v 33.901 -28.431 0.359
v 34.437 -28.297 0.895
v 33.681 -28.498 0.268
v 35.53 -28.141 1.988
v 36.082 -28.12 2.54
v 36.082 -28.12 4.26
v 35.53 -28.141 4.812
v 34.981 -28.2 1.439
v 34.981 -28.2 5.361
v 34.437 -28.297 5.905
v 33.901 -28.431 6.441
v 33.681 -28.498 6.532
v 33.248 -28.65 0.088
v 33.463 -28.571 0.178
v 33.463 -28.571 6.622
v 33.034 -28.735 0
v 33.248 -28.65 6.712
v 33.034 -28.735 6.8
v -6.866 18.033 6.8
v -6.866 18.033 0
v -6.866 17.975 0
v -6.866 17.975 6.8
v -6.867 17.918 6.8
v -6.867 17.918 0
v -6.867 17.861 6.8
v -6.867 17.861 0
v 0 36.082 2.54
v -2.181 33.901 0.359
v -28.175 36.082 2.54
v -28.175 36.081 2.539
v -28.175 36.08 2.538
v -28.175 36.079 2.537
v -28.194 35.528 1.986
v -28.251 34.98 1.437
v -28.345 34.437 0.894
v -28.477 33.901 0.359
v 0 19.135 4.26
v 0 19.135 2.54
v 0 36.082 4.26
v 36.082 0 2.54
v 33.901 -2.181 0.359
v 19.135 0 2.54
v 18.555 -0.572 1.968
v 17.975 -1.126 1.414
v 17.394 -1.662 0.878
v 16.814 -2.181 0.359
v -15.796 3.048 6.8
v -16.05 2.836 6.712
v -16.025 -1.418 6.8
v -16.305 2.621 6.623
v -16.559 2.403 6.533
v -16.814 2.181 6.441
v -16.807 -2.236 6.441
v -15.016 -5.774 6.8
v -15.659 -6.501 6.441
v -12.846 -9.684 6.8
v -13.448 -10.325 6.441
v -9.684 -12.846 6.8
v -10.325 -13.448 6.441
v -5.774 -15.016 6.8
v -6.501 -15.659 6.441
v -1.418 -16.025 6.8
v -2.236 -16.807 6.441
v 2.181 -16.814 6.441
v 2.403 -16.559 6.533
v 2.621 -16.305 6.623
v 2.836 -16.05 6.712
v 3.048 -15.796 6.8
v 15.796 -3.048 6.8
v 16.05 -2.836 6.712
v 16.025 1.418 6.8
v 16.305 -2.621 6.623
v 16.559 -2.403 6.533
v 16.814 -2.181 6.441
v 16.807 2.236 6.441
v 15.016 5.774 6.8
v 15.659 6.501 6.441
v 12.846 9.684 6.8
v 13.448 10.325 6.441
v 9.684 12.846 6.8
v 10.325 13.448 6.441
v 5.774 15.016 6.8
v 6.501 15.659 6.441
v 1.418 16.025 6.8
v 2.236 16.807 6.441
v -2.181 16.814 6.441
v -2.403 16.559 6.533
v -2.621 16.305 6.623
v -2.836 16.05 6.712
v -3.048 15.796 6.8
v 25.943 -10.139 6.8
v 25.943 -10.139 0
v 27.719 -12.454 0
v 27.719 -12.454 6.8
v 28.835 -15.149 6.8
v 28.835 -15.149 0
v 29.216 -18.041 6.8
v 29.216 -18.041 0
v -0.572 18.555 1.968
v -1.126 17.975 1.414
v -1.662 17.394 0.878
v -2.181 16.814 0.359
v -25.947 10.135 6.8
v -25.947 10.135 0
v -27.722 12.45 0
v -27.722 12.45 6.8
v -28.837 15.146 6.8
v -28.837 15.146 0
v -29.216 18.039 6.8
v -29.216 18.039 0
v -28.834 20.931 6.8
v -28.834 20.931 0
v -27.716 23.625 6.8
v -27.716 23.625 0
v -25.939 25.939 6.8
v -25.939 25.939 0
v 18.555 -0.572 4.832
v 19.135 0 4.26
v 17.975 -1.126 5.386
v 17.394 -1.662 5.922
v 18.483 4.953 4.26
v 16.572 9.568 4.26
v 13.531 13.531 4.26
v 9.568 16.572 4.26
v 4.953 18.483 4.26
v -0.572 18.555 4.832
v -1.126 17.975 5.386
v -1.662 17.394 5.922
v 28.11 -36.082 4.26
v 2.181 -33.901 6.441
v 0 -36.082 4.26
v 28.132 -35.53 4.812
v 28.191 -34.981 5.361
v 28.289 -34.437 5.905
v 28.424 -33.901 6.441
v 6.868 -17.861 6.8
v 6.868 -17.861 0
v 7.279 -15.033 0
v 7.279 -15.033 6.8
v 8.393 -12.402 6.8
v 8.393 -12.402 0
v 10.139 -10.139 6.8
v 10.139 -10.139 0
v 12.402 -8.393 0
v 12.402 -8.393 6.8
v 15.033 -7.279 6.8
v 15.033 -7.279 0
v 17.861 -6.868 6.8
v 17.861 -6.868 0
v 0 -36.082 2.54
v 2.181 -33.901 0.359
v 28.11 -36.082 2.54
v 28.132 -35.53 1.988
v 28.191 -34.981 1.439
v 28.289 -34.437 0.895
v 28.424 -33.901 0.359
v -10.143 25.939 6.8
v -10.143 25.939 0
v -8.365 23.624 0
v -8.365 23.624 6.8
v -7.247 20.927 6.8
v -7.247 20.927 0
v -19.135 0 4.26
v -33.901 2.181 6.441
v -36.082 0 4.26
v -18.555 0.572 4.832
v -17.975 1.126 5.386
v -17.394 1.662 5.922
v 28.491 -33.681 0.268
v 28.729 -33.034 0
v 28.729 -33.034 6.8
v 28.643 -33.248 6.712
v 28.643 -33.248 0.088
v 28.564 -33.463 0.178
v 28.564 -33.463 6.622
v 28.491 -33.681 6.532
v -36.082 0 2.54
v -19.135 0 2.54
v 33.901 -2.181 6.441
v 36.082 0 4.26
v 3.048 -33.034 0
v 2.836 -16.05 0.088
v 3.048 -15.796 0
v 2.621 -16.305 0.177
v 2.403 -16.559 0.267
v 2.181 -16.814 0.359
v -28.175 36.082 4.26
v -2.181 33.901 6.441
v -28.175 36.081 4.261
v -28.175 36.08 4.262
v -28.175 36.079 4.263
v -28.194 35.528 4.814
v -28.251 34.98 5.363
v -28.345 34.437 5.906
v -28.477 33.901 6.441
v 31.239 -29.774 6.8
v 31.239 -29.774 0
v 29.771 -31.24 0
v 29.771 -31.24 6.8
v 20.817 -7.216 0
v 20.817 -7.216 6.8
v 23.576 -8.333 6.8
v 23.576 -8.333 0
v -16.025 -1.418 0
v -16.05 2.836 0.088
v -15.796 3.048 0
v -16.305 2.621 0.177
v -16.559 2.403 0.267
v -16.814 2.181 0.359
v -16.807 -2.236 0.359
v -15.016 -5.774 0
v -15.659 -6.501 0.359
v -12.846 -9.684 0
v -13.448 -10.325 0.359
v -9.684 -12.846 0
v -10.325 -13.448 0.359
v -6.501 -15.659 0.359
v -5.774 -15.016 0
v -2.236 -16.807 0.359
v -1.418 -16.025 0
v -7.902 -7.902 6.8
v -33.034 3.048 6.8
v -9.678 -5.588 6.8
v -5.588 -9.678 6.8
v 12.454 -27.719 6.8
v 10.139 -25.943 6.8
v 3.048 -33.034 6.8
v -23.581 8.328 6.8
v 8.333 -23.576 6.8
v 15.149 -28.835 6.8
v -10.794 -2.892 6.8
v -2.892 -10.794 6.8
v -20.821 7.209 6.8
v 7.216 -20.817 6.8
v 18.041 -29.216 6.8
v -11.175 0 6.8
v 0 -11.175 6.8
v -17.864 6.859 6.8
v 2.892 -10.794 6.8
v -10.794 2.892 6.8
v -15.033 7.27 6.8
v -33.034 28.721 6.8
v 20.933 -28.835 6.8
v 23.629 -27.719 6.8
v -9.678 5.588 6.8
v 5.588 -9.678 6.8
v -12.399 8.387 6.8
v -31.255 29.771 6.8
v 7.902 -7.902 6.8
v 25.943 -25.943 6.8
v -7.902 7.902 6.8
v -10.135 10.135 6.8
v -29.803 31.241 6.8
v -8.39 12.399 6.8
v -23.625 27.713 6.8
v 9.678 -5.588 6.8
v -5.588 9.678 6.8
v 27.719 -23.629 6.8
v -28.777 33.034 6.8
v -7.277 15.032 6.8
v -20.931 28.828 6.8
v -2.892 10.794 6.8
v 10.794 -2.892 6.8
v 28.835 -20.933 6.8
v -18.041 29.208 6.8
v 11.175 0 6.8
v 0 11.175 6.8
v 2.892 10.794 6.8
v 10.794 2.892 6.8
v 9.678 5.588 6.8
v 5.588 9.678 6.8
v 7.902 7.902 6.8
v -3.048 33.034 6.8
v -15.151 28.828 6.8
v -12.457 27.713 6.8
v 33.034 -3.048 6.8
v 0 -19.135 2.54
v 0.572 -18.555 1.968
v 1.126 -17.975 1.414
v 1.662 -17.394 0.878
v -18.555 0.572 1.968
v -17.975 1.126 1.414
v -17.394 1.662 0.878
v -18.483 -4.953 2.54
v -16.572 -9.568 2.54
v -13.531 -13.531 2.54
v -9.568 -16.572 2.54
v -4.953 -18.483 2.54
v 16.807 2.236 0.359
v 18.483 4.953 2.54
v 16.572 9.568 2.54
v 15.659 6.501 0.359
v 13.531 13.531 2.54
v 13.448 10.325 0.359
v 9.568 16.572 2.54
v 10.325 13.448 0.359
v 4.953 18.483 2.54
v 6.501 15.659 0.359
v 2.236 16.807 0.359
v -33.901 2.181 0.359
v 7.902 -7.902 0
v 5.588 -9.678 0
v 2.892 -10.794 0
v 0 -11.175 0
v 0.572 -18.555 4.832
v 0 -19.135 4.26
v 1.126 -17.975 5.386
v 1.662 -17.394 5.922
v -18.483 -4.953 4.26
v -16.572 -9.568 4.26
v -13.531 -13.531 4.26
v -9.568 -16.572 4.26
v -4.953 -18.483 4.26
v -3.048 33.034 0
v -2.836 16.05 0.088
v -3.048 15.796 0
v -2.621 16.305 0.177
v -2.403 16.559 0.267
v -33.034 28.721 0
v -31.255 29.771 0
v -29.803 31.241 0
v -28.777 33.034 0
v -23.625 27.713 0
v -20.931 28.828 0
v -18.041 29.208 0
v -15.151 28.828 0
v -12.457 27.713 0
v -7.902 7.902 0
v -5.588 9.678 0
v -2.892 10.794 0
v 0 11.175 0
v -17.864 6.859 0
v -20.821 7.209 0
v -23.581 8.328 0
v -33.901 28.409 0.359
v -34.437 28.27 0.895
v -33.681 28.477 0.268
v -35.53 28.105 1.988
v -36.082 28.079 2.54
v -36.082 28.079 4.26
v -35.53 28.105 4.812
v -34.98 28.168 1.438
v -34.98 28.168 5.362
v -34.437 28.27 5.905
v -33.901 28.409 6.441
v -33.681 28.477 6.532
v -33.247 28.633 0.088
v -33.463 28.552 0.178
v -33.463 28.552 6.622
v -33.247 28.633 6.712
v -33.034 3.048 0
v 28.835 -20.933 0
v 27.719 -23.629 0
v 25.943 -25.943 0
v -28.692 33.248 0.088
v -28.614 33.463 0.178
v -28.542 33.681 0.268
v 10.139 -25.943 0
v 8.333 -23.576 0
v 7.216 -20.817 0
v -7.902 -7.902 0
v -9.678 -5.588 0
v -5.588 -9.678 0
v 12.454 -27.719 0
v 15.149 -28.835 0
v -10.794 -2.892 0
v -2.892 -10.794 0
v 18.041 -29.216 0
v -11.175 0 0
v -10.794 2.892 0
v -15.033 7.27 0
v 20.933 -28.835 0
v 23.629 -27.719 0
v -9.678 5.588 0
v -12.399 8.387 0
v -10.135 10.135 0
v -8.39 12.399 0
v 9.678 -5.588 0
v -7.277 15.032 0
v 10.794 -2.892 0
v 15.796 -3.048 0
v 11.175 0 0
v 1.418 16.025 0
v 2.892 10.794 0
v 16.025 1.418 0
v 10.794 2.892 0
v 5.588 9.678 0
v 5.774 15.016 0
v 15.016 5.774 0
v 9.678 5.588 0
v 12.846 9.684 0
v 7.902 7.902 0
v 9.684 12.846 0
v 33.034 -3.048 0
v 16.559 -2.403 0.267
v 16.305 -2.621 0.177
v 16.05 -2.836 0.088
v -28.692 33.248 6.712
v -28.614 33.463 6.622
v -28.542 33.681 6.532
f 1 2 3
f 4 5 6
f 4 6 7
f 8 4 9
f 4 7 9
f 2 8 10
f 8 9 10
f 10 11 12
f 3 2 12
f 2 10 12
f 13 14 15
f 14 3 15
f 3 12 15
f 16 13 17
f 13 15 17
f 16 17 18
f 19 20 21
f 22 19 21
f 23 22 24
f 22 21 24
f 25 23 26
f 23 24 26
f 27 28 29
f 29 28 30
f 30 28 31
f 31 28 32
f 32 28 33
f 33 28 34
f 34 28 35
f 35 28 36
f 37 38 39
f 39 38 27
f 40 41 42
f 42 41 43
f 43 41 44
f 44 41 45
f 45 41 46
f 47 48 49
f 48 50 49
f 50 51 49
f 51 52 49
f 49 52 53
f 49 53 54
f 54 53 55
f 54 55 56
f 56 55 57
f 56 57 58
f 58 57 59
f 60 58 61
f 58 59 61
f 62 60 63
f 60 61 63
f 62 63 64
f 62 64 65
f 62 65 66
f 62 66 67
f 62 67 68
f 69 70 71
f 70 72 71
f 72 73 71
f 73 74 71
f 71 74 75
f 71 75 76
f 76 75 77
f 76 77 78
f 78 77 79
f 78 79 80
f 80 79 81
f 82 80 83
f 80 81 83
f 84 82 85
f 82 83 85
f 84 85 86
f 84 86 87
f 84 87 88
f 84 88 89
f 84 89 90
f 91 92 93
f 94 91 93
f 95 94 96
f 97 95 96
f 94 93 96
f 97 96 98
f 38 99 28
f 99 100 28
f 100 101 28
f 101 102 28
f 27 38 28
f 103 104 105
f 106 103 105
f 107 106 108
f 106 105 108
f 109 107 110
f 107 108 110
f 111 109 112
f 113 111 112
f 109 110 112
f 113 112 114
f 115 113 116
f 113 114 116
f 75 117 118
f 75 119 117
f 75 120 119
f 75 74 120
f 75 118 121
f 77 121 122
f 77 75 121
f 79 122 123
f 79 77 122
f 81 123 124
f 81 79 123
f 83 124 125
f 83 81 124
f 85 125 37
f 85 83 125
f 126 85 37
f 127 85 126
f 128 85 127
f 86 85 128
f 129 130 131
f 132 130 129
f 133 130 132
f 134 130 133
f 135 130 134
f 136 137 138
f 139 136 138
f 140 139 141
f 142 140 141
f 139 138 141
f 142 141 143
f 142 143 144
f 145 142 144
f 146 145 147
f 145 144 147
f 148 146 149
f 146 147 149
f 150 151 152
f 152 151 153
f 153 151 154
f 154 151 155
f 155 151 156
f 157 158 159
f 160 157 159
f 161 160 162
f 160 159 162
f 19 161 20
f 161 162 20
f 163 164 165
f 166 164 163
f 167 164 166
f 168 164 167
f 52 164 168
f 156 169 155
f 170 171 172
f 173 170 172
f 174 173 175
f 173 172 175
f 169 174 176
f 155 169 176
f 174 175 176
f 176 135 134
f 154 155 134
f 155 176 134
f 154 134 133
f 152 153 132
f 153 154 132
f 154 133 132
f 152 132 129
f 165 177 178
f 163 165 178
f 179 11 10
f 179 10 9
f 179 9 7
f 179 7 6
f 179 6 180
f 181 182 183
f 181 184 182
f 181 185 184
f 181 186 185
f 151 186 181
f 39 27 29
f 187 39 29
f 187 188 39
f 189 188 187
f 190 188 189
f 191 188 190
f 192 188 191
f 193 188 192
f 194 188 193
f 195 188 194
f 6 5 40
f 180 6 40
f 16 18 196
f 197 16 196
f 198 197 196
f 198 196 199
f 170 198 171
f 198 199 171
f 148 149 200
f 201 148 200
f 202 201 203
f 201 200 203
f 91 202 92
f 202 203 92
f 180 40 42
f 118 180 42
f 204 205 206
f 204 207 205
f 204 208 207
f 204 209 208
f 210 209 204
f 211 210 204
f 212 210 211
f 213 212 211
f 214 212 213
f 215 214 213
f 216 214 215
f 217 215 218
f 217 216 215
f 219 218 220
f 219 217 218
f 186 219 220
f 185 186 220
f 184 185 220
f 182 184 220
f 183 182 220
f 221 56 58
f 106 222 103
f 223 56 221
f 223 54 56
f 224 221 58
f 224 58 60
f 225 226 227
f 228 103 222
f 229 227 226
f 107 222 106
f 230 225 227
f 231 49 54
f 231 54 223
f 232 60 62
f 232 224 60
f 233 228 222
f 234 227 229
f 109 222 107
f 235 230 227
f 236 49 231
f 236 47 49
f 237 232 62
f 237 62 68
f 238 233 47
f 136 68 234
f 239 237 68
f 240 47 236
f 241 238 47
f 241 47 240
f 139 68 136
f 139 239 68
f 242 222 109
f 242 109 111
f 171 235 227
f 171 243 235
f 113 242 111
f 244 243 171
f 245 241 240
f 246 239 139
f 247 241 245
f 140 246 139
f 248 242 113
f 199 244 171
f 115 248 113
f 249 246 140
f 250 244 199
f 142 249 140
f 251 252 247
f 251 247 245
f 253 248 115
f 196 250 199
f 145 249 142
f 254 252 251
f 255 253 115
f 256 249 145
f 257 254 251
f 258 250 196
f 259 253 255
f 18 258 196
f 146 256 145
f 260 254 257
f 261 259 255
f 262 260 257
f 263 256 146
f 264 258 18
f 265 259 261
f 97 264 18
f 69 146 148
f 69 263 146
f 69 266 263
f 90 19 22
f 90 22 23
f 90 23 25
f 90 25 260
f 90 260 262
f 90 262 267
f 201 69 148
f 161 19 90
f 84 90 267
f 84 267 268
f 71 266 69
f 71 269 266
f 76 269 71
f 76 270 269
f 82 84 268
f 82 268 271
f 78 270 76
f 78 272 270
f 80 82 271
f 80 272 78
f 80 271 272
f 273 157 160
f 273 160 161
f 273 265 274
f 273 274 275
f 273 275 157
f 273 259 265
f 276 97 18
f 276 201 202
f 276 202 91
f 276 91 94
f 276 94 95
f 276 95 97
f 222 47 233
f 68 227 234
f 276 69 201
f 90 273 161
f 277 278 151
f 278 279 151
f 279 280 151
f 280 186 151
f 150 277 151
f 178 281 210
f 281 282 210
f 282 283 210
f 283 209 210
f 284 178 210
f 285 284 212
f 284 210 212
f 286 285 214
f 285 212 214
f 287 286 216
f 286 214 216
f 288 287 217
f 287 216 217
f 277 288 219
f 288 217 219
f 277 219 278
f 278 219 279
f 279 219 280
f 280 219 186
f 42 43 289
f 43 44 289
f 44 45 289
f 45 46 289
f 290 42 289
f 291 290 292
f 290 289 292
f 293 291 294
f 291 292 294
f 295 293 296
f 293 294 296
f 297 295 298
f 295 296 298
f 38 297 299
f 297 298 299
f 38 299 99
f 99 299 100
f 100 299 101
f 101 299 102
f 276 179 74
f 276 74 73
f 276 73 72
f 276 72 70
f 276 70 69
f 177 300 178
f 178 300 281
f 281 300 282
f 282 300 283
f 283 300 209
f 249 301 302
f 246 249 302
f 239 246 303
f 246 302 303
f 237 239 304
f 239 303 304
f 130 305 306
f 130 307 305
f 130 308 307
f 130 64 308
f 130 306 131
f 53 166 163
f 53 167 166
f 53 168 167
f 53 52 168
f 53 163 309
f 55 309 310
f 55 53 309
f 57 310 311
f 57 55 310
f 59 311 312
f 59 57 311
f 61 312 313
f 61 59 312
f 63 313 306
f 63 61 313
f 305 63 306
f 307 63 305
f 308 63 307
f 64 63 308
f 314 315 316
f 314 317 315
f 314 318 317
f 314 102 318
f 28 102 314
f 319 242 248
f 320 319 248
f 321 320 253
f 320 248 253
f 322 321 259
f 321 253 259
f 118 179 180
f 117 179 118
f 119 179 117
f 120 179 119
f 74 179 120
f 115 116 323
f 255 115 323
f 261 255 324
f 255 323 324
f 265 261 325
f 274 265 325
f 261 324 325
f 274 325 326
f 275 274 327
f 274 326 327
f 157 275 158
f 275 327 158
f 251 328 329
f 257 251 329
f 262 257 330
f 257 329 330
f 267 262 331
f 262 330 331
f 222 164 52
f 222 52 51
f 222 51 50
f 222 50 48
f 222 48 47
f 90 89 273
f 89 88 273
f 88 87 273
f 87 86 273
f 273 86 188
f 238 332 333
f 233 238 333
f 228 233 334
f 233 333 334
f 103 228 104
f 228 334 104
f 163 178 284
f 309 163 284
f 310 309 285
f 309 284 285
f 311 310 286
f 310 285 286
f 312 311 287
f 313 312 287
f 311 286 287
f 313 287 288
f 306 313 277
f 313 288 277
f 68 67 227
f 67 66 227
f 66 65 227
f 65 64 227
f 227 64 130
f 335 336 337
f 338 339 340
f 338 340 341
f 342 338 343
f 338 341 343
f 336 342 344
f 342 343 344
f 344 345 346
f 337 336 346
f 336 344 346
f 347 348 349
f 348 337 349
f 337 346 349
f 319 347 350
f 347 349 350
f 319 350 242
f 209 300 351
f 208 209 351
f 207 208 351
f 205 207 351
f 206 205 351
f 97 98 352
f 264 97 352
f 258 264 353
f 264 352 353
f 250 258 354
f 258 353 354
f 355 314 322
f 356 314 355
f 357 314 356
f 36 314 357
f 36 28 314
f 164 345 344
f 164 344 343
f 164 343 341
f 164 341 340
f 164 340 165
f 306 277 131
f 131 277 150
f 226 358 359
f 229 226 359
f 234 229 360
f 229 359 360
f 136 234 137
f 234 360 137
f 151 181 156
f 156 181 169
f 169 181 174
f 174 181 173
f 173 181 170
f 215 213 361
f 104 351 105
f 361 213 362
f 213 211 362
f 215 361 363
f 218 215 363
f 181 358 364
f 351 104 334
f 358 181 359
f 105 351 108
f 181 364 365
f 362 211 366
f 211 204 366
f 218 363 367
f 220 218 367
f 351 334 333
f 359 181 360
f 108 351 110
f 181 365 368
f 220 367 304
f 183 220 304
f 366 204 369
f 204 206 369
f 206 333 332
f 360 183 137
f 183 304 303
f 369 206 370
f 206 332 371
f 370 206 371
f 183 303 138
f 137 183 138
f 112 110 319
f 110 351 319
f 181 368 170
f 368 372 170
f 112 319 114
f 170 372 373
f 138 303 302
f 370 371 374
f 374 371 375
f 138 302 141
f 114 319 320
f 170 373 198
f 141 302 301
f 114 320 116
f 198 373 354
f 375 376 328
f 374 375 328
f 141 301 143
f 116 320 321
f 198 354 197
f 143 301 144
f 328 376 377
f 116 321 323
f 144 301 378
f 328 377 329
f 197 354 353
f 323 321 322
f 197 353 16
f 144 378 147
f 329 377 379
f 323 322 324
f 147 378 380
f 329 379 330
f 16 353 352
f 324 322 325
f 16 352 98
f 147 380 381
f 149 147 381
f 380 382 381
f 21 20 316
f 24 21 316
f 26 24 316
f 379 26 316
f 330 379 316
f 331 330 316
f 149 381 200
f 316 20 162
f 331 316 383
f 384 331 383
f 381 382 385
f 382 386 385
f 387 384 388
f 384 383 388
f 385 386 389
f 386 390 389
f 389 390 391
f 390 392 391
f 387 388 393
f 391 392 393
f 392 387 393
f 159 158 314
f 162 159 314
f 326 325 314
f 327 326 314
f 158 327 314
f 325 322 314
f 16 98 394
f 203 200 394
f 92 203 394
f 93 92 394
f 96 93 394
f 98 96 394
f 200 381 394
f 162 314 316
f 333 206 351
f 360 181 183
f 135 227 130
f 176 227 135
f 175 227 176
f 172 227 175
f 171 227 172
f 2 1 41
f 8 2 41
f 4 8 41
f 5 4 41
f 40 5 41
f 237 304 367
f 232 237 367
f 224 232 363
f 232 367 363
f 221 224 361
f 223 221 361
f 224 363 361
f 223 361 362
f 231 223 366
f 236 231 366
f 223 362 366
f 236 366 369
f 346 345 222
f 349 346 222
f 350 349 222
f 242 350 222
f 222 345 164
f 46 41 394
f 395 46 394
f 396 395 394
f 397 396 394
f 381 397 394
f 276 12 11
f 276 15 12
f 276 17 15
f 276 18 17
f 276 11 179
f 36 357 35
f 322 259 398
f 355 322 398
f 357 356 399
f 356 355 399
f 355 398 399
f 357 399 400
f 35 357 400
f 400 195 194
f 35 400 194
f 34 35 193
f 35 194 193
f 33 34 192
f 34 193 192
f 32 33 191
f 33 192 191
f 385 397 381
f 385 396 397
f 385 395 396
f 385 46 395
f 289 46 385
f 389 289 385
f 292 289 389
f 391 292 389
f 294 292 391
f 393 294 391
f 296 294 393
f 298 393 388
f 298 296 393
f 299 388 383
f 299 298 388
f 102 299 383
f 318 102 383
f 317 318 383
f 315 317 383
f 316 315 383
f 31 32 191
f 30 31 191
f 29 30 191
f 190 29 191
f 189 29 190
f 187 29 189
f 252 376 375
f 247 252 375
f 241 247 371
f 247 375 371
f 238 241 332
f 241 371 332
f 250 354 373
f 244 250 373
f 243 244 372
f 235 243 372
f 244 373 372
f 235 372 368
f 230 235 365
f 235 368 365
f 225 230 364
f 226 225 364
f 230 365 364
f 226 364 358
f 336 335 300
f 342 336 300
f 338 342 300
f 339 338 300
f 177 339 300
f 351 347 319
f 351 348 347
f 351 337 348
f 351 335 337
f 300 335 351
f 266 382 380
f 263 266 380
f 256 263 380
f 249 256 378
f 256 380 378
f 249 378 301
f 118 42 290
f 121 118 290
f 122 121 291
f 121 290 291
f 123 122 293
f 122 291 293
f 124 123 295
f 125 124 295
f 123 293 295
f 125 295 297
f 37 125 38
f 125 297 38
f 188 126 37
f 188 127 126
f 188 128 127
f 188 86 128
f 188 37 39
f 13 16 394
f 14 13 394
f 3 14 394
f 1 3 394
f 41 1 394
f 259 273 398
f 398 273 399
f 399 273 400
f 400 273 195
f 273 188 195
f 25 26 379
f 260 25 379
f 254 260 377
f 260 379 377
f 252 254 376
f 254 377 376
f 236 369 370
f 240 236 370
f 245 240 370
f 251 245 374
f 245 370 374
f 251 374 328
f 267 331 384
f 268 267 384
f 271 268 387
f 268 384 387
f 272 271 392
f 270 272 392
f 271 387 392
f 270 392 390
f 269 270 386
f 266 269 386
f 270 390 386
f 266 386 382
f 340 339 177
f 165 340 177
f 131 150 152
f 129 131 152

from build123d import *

# Parameters (mm, degrees)
F1_DEPTH = 6.8
F2_SIZE  = 2.54
F3_SIZE  = 0.508
F5_DEPTH = 6.801


with BuildPart() as f1:
    # F0 (on Top) → F1 (new body)
    with BuildSketch(Plane.XY):
        with BuildLine():
            ThreePointArc((0, -11.175), (-7.9019182798, -7.9019182798), (-11.175, 0))
            Line((-11.175, 0), (-19.135426009, 0))
            ThreePointArc((-19.135426009, 0), (-13.5307894918, -13.5307894918), (0, -19.135426009))
            Line((0, -19.135426009), (0, -11.175))
        make_face()
        with BuildLine():
            Line((-19.135426009, 0), (-11.175, 0))
            ThreePointArc((-11.175, 0), (-10.3243537758, 4.2764873567), (-7.9019182798, 7.9019182798))
            Line((-7.9019182798, 7.9019182798), (-10.1350344611, 10.1350344611))
            ThreePointArc((-10.1350344611, 10.1350344611), (-13.6801442317, 7.7438710244), (-17.8637937449, 6.8592566349))
            ThreePointArc((-17.8637937449, 6.8592566349), (-18.8148323403, 3.4880671653), (-19.135426009, 0))
        make_face()
        with BuildLine():
            ThreePointArc((-7.9019182798, 7.9019182798), (-4.2764873567, 10.3243537758), (0, 11.175))
            Line((0, 11.175), (0, 19.135426009))
            ThreePointArc((0, 19.135426009), (-3.4923449173, 18.8140387882), (-6.8673791432, 17.8606727826))
            ThreePointArc((-6.8673791432, 17.8606727826), (-7.7488210815, 13.6796226746), (-10.1350344611, 10.1350344611))
            Line((-10.1350344611, 10.1350344611), (-7.9019182798, 7.9019182798))
        make_face()
        with BuildLine():
            Line((0, 19.135426009), (0, 11.175))
            ThreePointArc((0, 11.175), (7.9019182798, 7.9019182798), (11.175, 0))
            Line((11.175, 0), (19.135426009, 0))
            ThreePointArc((19.135426009, 0), (13.5307894918, 13.5307894918), (0, 19.135426009))
        make_face()
        with BuildLine():
            Line((19.135426009, 0), (11.175, 0))
            ThreePointArc((11.175, 0), (10.3243537758, -4.2764873567), (7.9019182798, -7.9019182798))
            Line((7.9019182798, -7.9019182798), (10.139134376, -10.139134376))
            ThreePointArc((10.139134376, -10.139134376), (13.6813541851, -7.7515602366), (17.8606227185, -6.8675093486))
            ThreePointArc((17.8606227185, -6.8675093486), (18.8140260583, -3.4924134951), (19.135426009, 0))
        make_face()
        with BuildLine():
            ThreePointArc((7.9019182798, -7.9019182798), (4.2764873567, -10.3243537758), (0, -11.175))
            Line((0, -11.175), (0, -19.135426009))
            ThreePointArc((0, -19.135426009), (3.4924134951, -18.8140260583), (6.8675093486, -17.8606227185))
            ThreePointArc((6.8675093486, -17.8606227185), (7.7515602366, -13.6813541851), (10.139134376, -10.139134376))
            Line((10.139134376, -10.139134376), (7.9019182798, -7.9019182798))
        make_face()
        with BuildLine():
            Line((-36.0821053116, 0), (-19.135426009, 0))
            ThreePointArc((-19.135426009, 0), (-18.8148323403, 3.4880671653), (-17.8637937449, 6.8592566349))
            ThreePointArc((-17.8637937449, 6.8592566349), (-22.2382076575, 7.6759923472), (-25.9470708504, 10.1350344611))
            Line((-25.9470708504, 10.1350344611), (-36.0821053116, 0))
        make_face()
        with BuildLine():
            ThreePointArc((-6.8673791432, 17.8606727826), (-3.4923449173, 18.8140387882), (0, 19.135426009))
            Line((0, 19.135426009), (0, 36.0821053116))
            Line((0, 36.0821053116), (-10.1432364193, 25.9388688923))
            ThreePointArc((-10.1432364193, 25.9388688923), (-7.7178089445, 22.3120170041), (-6.8660526558, 18.0328506976))
            ThreePointArc((-6.8660526558, 18.0328506976), (-6.8663842826, 17.9467591853), (-6.8673791432, 17.8606727826))
        make_face()
        with BuildLine():
            Line((36.0821053116, 0), (19.135426009, 0))
            ThreePointArc((19.135426009, 0), (18.8140260583, -3.4924134951), (17.8606227185, -6.8675093486))
            ThreePointArc((17.8606227185, -6.8675093486), (22.2340501678, -7.6825104386), (25.9429709355, -10.139134376))
            Line((25.9429709355, -10.139134376), (36.0821053116, 0))
        make_face()
        with BuildLine():
            ThreePointArc((6.8675093486, -17.8606227185), (3.4924134951, -18.8140260583), (0, -19.135426009))
            Line((0, -19.135426009), (0, -36.0821053116))
            Line((0, -36.0821053116), (10.139134376, -25.9429709355))
            ThreePointArc((10.139134376, -25.9429709355), (7.6825104386, -22.2340501678), (6.8675093486, -17.8606227185))
        make_face()
        with BuildLine():
            Line((-36.0821053116, 36.0821053116), (-36.0821053116, 0))
            Line((-36.0821053116, 0), (-25.9470708504, 10.1350344611))
            ThreePointArc((-25.9470708504, 10.1350344611), (-29.2160511508, 18.0386503579), (-25.9388688923, 25.9388688923))
            Line((-25.9388688923, 25.9388688923), (-36.0821053116, 36.0821053116))
        make_face()
        with BuildLine():
            Line((-10.1432364193, 25.9388688923), (0, 36.0821053116))
            Line((0, 36.0821053116), (-36.0821053116, 36.0821053116))
            Line((-36.0821053116, 36.0821053116), (-25.9388688923, 25.9388688923))
            ThreePointArc((-25.9388688923, 25.9388688923), (-18.0410526558, 29.2078506976), (-10.1432364193, 25.9388688923))
        make_face()
        with BuildLine():
            Line((36.0821053116, -36.0821053116), (36.0821053116, 0))
            Line((36.0821053116, 0), (25.9429709355, -10.139134376))
            ThreePointArc((25.9429709355, -10.139134376), (28.3654064316, -13.7645652991), (29.2160526558, -18.0410526558))
            ThreePointArc((29.2160526558, -18.0410526558), (28.3654064316, -22.3175400125), (25.9429709355, -25.9429709355))
            Line((25.9429709355, -25.9429709355), (36.0821053116, -36.0821053116))
        make_face()
        with BuildLine():
            Line((10.139134376, -25.9429709355), (0, -36.0821053116))
            Line((0, -36.0821053116), (36.0821053116, -36.0821053116))
            Line((36.0821053116, -36.0821053116), (25.9429709355, -25.9429709355))
            ThreePointArc((25.9429709355, -25.9429709355), (18.0410526558, -29.2160526558), (10.139134376, -25.9429709355))
        make_face()
    extrude(amount=F1_DEPTH)

    # F2
    f2_edges = [f1.edges().sort_by_distance(p)[0] for p in [
        (-13.530789, -13.530789, 6.8),
        (-13.530789, -13.530789, 0),
        (-27.608766, 0, 6.8),
        (-27.608766, 0, 0),
        (18.041053, -36.082105, 6.8),
        (18.041053, -36.082105, 0),
        (0, -27.608766, 0),
        (0, -27.608766, 6.8),
        (36.082105, -18.041053, 6.8),
        (36.082105, -18.041053, 0),
        (27.608766, 0, 0),
        (27.608766, 0, 6.8),
        (13.530789, 13.530789, 6.8),
        (13.530789, 13.530789, 0),
        (0, 27.608766, 6.8),
        (0, 27.608766, 0),
        (-18.041053, 36.082105, 0),
        (-18.041053, 36.082105, 6.8),
        (-36.082105, 18.041053, 6.8),
        (-36.082105, 18.041053, 0),
    ]]
    chamfer(f2_edges, length=F2_SIZE)

    # F3
    f3_edges = [f1.edges().sort_by_distance(p)[0] for p in [
        (-33.542105, 18.041053, 6.8),
        (-24.971, 2.54, 6.8),
        (-11.734738, -11.734738, 6.8),
        (2.54, -24.971, 6.8),
        (18.041053, -33.542105, 6.8),
        (33.542105, -18.041053, 6.8),
        (24.971, -2.54, 6.8),
        (11.734738, 11.734738, 6.8),
        (-2.54, 24.971, 6.8),
        (-18.041053, 33.542105, 6.8),
        (33.542105, -18.041053, 0),
        (18.041053, -33.542105, 0),
        (2.54, -24.971, 0),
        (-11.734738, -11.734738, 0),
        (-24.971, 2.54, 0),
        (-33.542105, 18.041053, 0),
        (-18.041053, 33.542105, 0),
        (-2.54, 24.971, 0),
        (11.734738, 11.734738, 0),
        (24.971, -2.54, 0),
    ]]
    chamfer(f3_edges, length=F3_SIZE)

    # F4 (on face) → F5 (cut, through all)
    with BuildSketch(Plane.XY.offset(6.8)):
        with BuildLine():
            Line((-36.1747518182, 36.0786728561), (-28.1747518182, 36.0786728561))
            ThreePointArc((-28.1747518182, 36.0786728561), (-41.8316060677, 41.7355271056), (-36.1747518182, 28.0786728561))
            Line((-36.1747518182, 28.0786728561), (-36.1747518182, 36.0786728561))
        make_face()
        with BuildLine():
            Line((-28.7767379991, 33.0341053116), (-33.0341053116, 33.0341053116))
            Line((-33.0341053116, 33.0341053116), (-33.0341053116, 28.7209327465))
            ThreePointArc((-33.0341053116, 28.7209327465), (-30.4811848555, 30.4587711451), (-28.7767379991, 33.0341053116))
        make_face()
        with BuildLine():
            Line((-33.0341053116, 28.7209327465), (-33.0341053116, 33.0341053116))
            Line((-33.0341053116, 33.0341053116), (-28.7767379991, 33.0341053116))
            ThreePointArc((-28.7767379991, 33.0341053116), (-28.3266912121, 34.5269174875), (-28.1747518182, 36.0786728561))
            Line((-28.1747518182, 36.0786728561), (-36.1747518182, 36.0786728561))
            Line((-36.1747518182, 36.0786728561), (-36.1747518182, 28.0786728561))
            ThreePointArc((-36.1747518182, 28.0786728561), (-34.5719294445, 28.2408823231), (-33.0341053116, 28.7209327465))
        make_face()
        with BuildLine():
            Line((36.1097641289, -36.1202992499), (36.1097641289, -28.1202992499))
            ThreePointArc((36.1097641289, -28.1202992499), (34.5415065384, -28.2755195761), (33.0341053116, -28.7351572175))
            Line((33.0341053116, -28.7351572175), (33.0341053116, -33.0341053116))
            Line((33.0341053116, -33.0341053116), (28.7290184366, -33.0341053116))
            ThreePointArc((28.7290184366, -33.0341053116), (28.2661053673, -34.5464449902), (28.1097641289, -36.1202992499))
            Line((28.1097641289, -36.1202992499), (36.1097641289, -36.1202992499))
        make_face()
        with BuildLine():
            ThreePointArc((44.1097641289, -36.1202992499), (41.7666183784, -30.4634450004), (36.1097641289, -28.1202992499))
            Line((36.1097641289, -28.1202992499), (36.1097641289, -36.1202992499))
            Line((36.1097641289, -36.1202992499), (28.1097641289, -36.1202992499))
            ThreePointArc((28.1097641289, -36.1202992499), (36.1097641289, -44.1202992499), (44.1097641289, -36.1202992499))
        make_face()
        with BuildLine():
            Line((33.0341053116, -33.0341053116), (33.0341053116, -28.7351572175))
            ThreePointArc((33.0341053116, -28.7351572175), (30.4569473535, -30.459410406), (28.7290184366, -33.0341053116))
            Line((28.7290184366, -33.0341053116), (33.0341053116, -33.0341053116))
        make_face()
    extrude(amount=-F5_DEPTH, mode=Mode.SUBTRACT)


solid = f1.part
